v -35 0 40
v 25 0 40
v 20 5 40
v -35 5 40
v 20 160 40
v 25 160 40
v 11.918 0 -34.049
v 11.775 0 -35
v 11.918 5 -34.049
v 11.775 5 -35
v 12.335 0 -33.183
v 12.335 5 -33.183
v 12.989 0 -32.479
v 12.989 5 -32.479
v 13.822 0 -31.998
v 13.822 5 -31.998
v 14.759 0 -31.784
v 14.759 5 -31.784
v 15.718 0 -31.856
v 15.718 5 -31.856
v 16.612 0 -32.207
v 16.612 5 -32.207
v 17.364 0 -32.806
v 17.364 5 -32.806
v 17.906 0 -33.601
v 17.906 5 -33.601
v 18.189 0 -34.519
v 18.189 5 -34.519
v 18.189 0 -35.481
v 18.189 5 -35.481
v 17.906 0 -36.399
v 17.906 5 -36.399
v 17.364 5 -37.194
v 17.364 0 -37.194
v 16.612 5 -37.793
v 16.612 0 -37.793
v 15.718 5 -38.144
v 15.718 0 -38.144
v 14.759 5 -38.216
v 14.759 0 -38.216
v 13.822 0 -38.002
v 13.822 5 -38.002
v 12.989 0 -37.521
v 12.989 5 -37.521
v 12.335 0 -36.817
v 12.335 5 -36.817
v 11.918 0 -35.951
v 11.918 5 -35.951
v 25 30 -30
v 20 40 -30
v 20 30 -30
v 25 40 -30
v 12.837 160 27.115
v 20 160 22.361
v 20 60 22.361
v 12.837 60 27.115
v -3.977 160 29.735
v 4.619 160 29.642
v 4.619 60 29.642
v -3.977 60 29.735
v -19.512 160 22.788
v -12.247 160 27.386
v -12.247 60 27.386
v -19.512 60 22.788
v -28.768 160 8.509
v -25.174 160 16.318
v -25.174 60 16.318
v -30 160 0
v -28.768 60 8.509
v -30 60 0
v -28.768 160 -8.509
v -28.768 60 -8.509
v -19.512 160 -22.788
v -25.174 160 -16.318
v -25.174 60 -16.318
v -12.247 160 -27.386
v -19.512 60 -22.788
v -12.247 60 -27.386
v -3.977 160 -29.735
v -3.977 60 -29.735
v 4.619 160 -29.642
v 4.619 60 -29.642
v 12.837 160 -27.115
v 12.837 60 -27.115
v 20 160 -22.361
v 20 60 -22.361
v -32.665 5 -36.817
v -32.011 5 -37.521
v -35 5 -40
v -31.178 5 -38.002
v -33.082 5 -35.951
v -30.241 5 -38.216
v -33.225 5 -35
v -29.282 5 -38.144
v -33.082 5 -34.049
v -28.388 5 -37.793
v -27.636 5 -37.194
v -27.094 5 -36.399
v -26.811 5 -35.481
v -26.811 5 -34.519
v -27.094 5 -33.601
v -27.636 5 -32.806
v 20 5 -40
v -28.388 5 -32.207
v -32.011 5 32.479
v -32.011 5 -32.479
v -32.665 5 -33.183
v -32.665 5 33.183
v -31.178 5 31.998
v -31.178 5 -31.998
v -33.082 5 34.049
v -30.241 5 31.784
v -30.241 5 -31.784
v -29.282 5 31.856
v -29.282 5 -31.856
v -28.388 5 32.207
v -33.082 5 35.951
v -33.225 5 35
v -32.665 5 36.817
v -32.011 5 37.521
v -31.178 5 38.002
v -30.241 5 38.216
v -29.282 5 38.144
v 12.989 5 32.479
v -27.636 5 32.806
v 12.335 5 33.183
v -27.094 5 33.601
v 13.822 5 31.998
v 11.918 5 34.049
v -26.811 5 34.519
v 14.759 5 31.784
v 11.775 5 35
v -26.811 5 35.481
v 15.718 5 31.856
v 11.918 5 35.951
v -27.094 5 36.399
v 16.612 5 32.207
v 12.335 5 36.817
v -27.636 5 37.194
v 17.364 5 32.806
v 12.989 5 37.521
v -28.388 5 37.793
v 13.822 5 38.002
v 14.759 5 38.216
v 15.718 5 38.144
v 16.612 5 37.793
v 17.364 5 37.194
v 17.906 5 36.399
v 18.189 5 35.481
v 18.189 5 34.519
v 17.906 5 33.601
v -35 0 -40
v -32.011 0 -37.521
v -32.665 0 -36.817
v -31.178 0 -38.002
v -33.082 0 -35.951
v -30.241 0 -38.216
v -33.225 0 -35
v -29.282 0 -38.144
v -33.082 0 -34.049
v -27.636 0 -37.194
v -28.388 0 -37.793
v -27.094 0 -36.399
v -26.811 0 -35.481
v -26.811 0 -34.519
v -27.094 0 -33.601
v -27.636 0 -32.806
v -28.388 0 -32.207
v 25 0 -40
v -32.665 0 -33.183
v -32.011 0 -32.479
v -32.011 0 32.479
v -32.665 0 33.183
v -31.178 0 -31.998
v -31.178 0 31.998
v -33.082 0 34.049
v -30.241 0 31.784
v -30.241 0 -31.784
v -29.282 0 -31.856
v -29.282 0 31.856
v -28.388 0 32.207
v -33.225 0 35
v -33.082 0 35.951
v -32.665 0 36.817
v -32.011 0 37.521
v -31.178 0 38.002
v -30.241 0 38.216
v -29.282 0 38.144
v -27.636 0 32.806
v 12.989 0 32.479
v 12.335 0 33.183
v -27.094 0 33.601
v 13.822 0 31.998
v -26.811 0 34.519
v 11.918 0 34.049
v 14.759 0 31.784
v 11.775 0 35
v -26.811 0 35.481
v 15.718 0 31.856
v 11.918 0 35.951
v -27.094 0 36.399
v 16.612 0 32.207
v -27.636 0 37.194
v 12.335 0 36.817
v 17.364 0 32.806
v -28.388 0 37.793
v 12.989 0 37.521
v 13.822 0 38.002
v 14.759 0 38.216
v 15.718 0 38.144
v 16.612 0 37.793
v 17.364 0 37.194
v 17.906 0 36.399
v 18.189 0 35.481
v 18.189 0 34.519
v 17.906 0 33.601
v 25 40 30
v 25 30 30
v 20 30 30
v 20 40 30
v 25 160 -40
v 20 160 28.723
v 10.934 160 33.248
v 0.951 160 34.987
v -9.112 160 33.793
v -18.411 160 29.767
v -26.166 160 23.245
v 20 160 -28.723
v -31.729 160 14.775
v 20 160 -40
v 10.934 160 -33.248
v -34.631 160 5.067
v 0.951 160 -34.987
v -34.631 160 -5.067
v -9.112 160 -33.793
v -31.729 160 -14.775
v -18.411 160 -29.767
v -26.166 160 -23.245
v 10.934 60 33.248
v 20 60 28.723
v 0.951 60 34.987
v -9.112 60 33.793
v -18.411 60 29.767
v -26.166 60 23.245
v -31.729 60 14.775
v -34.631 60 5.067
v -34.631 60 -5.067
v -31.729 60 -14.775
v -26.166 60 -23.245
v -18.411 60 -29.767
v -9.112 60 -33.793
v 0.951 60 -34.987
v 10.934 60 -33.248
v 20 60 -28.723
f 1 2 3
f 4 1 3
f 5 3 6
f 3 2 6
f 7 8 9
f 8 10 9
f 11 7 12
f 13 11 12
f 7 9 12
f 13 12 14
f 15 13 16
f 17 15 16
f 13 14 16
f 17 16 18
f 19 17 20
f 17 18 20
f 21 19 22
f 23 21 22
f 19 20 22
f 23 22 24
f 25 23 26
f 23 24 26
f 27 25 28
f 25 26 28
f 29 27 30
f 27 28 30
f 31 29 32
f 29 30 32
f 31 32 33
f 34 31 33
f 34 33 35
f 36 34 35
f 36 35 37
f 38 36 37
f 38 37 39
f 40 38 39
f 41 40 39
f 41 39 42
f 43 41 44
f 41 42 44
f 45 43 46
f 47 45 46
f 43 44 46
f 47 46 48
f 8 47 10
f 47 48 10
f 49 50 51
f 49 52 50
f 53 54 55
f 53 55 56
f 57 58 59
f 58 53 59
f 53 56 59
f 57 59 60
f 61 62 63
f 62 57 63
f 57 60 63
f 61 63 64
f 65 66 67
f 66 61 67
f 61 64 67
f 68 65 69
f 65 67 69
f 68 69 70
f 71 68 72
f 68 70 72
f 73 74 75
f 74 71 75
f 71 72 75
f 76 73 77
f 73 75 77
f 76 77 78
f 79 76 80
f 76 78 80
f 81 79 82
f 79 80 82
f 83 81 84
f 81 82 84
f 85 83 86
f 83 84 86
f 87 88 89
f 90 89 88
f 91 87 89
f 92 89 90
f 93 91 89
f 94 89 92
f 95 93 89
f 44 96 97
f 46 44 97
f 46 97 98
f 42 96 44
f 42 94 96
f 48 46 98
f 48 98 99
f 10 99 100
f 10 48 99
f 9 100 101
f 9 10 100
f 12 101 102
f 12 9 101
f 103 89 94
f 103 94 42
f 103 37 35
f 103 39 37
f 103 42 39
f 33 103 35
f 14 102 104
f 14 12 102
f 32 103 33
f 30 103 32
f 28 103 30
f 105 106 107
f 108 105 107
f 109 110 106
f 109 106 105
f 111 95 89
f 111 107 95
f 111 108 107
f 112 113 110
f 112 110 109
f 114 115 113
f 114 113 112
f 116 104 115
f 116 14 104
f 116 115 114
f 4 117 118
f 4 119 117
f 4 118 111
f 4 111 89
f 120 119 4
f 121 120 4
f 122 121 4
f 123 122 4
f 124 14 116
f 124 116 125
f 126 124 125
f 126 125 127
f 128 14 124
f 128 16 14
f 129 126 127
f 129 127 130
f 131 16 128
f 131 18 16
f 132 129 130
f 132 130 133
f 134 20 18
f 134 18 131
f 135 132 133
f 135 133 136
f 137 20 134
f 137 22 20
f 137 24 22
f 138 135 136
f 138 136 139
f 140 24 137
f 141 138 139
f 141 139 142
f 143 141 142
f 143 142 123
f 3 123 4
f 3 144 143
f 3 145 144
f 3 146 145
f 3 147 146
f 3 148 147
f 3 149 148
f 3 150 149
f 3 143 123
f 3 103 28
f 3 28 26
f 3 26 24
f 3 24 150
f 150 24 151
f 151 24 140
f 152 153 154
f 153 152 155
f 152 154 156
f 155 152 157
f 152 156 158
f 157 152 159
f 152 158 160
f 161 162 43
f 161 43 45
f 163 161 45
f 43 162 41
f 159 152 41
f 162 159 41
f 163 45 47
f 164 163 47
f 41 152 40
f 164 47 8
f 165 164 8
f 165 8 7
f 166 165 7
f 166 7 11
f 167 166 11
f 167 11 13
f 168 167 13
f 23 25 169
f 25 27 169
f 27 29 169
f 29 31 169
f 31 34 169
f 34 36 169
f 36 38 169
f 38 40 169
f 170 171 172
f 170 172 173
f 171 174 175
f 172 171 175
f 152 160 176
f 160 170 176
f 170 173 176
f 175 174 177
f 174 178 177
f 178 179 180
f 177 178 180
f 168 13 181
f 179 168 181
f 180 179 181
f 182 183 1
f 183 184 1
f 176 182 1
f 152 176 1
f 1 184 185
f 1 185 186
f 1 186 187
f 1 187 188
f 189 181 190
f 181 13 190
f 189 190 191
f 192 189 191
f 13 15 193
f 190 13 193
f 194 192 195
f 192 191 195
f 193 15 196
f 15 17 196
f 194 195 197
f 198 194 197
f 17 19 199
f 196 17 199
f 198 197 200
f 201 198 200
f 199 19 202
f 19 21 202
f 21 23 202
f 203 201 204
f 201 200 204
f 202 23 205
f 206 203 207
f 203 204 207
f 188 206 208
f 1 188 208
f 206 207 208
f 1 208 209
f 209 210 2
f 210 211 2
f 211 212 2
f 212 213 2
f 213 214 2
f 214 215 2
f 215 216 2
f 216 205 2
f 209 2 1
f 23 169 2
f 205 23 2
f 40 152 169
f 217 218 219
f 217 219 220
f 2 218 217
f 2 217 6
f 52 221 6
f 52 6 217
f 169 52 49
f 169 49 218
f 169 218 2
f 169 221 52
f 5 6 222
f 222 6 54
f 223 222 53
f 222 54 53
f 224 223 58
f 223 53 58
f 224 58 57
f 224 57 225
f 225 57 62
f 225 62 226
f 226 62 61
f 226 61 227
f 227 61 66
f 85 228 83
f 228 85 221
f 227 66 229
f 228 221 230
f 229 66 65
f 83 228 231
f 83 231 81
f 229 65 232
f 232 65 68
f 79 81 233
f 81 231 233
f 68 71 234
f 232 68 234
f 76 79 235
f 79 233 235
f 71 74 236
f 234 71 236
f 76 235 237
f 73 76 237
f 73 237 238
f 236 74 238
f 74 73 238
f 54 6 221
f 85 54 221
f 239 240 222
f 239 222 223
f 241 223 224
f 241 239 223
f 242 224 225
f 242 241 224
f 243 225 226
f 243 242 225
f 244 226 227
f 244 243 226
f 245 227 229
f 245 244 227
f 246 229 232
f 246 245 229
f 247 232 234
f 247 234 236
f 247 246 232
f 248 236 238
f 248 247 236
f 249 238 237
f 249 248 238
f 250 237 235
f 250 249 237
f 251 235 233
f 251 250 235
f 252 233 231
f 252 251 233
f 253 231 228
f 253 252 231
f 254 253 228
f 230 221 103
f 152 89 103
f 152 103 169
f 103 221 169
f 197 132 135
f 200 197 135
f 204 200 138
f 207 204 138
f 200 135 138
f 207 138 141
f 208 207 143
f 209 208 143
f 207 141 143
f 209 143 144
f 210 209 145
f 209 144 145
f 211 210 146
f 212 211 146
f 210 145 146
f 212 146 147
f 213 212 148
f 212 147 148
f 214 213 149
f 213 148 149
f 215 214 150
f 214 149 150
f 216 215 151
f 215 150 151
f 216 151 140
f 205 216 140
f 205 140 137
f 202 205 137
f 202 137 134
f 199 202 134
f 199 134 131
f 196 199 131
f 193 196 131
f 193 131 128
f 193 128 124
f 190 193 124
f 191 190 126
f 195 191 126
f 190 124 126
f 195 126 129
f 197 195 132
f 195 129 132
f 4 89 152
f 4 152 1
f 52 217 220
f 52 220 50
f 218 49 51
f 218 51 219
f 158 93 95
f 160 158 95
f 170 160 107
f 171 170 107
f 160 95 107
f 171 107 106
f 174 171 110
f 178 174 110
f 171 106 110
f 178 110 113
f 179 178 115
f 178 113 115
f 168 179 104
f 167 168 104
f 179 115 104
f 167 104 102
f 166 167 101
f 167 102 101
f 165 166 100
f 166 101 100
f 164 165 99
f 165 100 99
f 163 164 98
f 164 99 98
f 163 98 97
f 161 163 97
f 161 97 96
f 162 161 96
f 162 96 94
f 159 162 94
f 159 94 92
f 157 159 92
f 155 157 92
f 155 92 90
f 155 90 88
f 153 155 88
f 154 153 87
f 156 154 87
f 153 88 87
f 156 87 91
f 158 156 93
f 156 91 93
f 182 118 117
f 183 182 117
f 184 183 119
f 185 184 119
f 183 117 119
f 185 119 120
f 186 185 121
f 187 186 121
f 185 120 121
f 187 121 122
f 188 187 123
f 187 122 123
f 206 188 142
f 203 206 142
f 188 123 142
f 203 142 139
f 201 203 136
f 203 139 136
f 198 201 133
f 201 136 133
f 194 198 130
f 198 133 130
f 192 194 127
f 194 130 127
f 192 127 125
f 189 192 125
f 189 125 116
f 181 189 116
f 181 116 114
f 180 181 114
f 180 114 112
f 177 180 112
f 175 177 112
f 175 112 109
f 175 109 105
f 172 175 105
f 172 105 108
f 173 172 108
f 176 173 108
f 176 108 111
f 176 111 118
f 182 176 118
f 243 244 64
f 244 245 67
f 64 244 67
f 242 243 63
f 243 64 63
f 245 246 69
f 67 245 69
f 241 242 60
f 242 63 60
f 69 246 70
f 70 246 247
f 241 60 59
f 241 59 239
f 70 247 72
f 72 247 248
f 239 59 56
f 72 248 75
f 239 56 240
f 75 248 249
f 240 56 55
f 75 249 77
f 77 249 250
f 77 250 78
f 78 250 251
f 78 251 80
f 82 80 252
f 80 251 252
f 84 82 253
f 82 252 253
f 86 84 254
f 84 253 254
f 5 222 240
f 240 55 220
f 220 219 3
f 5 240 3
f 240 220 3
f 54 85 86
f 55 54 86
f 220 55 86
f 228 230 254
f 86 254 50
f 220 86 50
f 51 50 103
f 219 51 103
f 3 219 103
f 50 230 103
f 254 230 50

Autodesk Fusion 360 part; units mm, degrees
ref_plane "WorkPlane1" through (0, 60, 0) normal (0, 1, 0) x (0, 0, 1)
sketch "Sketch1" plane through (0, 60, 0) normal (0, 1, 0) x (1, 0, 0)
  line L0 (20, 28.7228) -> (20, -28.7228)
  line L1 (25, 24.4949) -> (25, -24.4949)
  arc A0 (25, 24.4949) -> (25, -24.4949) centre (0, 0) ccw
  arc A1 (25, 16.5831) -> (25, -16.5831) centre (0, 0) ccw
  dimension "d2" = 60
  dimension "d3" = 70
  dimension "d4" = 20
  dimension "d5" = 5
extrude "Extrude1" add sketch "Sketch1" along normal blind 100 contours L0 L1 A0 A1 | L0 A0 A1 | L0 L1 A1 | L0 L1 A0 A1
extrude "Extrude2" add sketch "Sketch1" against normal blind 60 contours L0 L1 A0 A1 | L0 L1 A1 | L0 L1 A0 A1
ref_plane "WorkPlane2" through (0, 124.607, 35) normal (0, 0, 1) x (-1, 0, 0)
sketch "Sketch2" plane through (0, 124.607, 35) normal (0, 0, 1) x (1, 0, 0)
  line L0 (20, -64.607) -> (-35, -64.607)
  line L1 (20, -64.607) -> (20, -124.607)
  line L2 (20, -124.607) -> (25, -124.607)
  line L3 (25, -124.607) -> (25, 35.393)
  line L4 (25, 35.393) -> (-35, 35.393)
  line L5 (25, 35.393) -> (25, -124.607)
  line L6 (20, -124.607) -> (25, -124.607)
  line L7 (20, -124.607) -> (20, -64.607)
  line L8 (-10, -9.607) -> (10, -9.607)
  line L9 (10, -9.607) -> (10, -19.607)
  line L10 (10, -19.607) -> (-10, -19.607)
  line L11 (-10, -19.607) -> (-10, -9.607)
  dimension "d11" = 45
  dimension "d12" = 10
  dimension "d13" = 20
  dimension "d14" = 15
ref_plane "WorkPlane3" through (0, 127.6389, 35) normal (0, 0, 1) x (-1, 0, 0)
sketch "Sketch6" plane through (0, 127.6389, 35) normal (0, 0, 1) x (1, 0, 0)
  line L0 (20, -127.6389) -> (25, -127.6389)
  line L1 (20, -67.6389) -> (20, -127.6389)
  line L2 (25, 32.3611) -> (25, -127.6389)
  line L3 (20, -67.6389) -> (-35, -67.6389)
  line L4 (25, 32.3611) -> (-35, 32.3611)
  line L5 (-35, -67.6389) -> (-35, 32.3611)
  line L6 (25, 32.3611) -> (20, 32.3611)
  line L7 (20, 32.3611) -> (20, -127.6389)
  line L8 (20, -127.6389) -> (25, -127.6389)
  line L9 (25, -127.6389) -> (25, 32.3611)
extrude "Extrude9" add sketch "Sketch6" against normal blind 15 contours L0 L1 L2 L4 L6 L7 L8 L9
extrude "Extrude10" add sketch "Sketch6" along normal blind 5 contours L0 L1 L2 L4 L6 L7 L8 L9
mirror "Mirror2" about plane through (0, 0, 0) normal (0, 0, 1) of bodies 1 merged
sketch "Sketch7" plane through (25, 0, 0) normal (1, 0, 0) x (0, 0, -1)
  line L0 (40, 160) -> (-40, 160)
  line L1 (-40, 160) -> (-40, 0)
  line L2 (-40, 0) -> (40, 0)
  line L3 (40, 0) -> (40, 160)
  line L4 (-30, 40) -> (30, 40)
  line L5 (30, 40) -> (30, 30)
  line L6 (30, 30) -> (-30, 30)
  line L7 (-30, 30) -> (-30, 40)
  line L8 (28.7228, 160) -> (28.7228, 60)
  line L9 (35, 60) -> (-35, 60)
  line L10 (-28.7228, 60) -> (-28.7228, 160)
  line L11 (35, 160) -> (-35, 160)
  dimension "d41" = 60
  dimension "d42" = 10
  dimension "d43" = 10
  dimension "d45" = 20
extrude "Extrude11" cut sketch "Sketch7" against normal through all contours L4 L5 L6 L7
sketch "Sketch8" plane through (20, 0, 0) normal (-1, 0, 0) x (0, 0, 1)
  line L0 (30, 40) -> (30, 30)
  line L1 (30, 30) -> (-30, 30)
  line L2 (-30, 30) -> (-30, 40)
  line L3 (-30, 40) -> (30, 40)
  line L4 (-40, 0) -> (40, 0)
  line L5 (40, 0) -> (40, 160)
  line L6 (40, 160) -> (28.7228, 160)
  line L7 (28.7228, 160) -> (28.7228, 60)
  line L8 (28.7228, 60) -> (22.3607, 60)
  line L9 (22.3607, 60) -> (22.3607, 160)
  line L10 (22.3607, 160) -> (-22.3607, 160)
  line L11 (-22.3607, 160) -> (-22.3607, 60)
  line L12 (-22.3607, 60) -> (-28.7228, 60)
  line L13 (-28.7228, 60) -> (-28.7228, 160)
  line L14 (-28.7228, 160) -> (-40, 160)
  line L15 (-40, 160) -> (-40, 0)
  line L16 (-40, 5) -> (40, 5)
  line L17 (40, 5) -> (40, 0)
  line L18 (40, 0) -> (-40, 0)
  line L19 (-40, 0) -> (-40, 5)
  dimension "d47" = 5
extrude "Extrude12" add sketch "Sketch8" along normal blind 55 contours L4 L5 L15 L16 L17 L18 L19
sketch "Sketch9" plane through (0, 5, 0) normal (0, 1, 0) x (-1, 0, 0)
  line L0 (-20, 40) -> (-20, -40)
  line L1 (-20, -40) -> (35, -40)
  line L2 (35, -40) -> (35, 40)
  line L3 (35, 40) -> (-20, 40)
  circle A0 centre (-15, 35) radius 3.225
  circle A1 centre (30, 35) radius 3.225
  circle A2 centre (30, -35) radius 3.225
  circle A3 centre (-15, -35) radius 3.225
  dimension "d50" = 6.45
  dimension "d51" = 5
  dimension "d52" = 5
  dimension "d53" = 6.45
  dimension "d54" = 5
  dimension "d57" = 6.45
  dimension "d58" = 6.45
  dimension "d59" = 5
  dimension "d60" = 5
  dimension "d61" = 5
  dimension "d62" = 5
extrude "Extrude13" cut sketch "Sketch9" against normal blind 5 contours A0 | A1 | A2 | A3
